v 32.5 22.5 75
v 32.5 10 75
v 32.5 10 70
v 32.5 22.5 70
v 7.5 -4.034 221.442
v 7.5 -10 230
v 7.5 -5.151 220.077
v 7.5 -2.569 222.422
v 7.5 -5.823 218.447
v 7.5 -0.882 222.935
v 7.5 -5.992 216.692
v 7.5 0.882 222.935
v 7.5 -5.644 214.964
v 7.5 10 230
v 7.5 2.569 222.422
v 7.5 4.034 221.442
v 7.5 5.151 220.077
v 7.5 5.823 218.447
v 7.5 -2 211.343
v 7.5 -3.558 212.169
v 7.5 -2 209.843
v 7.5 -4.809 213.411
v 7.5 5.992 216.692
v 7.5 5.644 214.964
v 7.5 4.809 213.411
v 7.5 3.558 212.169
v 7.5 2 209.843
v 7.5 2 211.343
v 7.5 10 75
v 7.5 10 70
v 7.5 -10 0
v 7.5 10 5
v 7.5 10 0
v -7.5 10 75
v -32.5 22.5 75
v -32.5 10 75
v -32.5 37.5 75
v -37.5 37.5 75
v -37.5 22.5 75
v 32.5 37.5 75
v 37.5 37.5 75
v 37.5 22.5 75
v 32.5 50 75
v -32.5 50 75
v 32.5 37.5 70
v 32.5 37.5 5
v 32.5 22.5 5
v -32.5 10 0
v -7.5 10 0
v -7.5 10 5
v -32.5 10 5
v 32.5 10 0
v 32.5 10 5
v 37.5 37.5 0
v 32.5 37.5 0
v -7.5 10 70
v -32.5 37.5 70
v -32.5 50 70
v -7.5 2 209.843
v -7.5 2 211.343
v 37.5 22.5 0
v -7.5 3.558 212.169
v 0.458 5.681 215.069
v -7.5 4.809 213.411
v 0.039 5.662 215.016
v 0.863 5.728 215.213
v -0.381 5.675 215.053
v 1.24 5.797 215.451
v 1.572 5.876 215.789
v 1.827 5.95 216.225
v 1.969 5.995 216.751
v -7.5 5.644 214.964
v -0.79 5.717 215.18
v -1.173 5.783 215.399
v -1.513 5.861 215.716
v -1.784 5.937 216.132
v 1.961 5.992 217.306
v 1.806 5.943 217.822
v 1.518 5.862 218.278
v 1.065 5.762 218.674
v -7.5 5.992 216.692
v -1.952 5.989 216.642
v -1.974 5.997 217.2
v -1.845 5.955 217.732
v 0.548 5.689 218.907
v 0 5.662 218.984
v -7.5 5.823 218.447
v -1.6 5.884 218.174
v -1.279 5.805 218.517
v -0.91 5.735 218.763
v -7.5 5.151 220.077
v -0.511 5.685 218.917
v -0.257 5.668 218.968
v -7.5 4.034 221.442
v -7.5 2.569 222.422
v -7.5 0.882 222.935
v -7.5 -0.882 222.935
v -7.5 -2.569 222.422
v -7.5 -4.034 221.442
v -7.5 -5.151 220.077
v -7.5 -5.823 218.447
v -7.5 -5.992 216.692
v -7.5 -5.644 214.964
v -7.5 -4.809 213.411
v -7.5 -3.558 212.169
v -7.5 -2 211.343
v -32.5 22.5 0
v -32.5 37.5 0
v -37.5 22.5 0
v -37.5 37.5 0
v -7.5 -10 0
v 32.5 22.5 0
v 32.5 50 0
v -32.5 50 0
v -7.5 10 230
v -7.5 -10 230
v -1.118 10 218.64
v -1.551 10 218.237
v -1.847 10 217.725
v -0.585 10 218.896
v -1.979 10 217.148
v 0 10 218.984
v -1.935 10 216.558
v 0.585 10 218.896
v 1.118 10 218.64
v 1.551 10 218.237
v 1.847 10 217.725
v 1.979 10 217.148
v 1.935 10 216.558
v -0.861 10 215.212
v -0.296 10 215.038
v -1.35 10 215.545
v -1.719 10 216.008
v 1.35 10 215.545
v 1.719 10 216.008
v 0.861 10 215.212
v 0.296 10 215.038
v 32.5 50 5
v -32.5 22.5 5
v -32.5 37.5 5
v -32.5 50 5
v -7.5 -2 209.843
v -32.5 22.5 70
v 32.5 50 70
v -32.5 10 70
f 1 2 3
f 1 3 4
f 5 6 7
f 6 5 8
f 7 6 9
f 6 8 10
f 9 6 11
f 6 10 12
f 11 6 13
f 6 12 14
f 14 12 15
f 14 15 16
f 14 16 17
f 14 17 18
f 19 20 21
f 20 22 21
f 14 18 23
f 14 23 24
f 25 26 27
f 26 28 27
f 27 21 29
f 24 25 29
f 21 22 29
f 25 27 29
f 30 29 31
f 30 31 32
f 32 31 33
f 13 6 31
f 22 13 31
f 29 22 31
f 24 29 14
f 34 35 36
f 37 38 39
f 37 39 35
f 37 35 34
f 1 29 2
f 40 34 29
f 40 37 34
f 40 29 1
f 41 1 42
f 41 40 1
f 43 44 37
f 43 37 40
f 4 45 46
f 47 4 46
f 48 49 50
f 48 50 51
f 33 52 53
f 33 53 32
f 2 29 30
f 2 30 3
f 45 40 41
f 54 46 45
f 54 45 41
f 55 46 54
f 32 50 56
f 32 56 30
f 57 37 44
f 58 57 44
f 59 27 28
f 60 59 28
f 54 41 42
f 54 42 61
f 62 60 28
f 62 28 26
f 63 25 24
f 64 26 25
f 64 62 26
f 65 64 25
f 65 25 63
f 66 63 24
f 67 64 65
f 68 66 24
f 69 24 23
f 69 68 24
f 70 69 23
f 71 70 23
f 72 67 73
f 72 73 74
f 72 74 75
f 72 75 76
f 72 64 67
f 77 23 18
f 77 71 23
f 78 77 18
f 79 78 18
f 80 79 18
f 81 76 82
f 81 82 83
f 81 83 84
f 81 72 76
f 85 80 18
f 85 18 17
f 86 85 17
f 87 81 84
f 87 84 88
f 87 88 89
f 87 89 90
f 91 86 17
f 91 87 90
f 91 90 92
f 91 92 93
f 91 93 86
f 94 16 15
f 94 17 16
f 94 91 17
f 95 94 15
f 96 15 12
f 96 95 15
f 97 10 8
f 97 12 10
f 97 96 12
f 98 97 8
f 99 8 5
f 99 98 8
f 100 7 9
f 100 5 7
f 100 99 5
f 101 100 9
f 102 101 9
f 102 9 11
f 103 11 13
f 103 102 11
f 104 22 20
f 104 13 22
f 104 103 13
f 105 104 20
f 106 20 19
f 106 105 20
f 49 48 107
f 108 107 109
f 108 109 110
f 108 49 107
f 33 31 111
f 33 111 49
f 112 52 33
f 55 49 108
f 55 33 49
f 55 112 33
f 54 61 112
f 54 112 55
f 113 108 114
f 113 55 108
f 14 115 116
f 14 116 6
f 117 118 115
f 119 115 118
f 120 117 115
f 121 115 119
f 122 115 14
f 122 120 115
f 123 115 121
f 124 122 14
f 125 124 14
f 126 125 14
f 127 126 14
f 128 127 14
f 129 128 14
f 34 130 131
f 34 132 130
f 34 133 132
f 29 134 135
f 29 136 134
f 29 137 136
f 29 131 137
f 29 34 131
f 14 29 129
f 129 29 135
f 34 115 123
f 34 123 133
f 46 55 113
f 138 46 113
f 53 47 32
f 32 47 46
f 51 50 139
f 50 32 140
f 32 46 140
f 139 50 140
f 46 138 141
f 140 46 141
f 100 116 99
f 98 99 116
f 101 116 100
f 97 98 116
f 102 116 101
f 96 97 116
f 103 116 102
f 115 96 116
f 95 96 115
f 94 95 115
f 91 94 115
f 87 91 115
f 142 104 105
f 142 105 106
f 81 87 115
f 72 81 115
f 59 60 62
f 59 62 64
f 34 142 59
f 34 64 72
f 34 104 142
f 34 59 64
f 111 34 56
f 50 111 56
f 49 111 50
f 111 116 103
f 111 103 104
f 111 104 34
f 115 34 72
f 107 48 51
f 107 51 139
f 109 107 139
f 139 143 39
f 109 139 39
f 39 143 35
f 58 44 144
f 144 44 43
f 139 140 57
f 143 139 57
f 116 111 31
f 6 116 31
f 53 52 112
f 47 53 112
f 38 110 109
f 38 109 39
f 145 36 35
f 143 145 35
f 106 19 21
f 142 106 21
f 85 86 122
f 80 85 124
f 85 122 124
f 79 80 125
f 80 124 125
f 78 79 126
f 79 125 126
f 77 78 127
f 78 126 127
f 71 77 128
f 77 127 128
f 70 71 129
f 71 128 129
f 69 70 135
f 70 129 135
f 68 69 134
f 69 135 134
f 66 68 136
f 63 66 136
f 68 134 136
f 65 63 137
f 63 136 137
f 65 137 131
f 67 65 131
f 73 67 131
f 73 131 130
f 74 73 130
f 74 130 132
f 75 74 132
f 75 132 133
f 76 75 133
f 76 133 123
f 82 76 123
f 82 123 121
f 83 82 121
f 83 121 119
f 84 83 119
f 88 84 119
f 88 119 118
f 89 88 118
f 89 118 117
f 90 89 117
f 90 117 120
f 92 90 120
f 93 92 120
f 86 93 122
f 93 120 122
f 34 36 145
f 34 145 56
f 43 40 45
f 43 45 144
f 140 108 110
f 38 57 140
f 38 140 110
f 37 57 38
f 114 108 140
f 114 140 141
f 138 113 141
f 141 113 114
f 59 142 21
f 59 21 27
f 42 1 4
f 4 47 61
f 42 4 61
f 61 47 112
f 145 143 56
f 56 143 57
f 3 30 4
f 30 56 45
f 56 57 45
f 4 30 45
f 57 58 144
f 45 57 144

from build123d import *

# Parameters (mm, degrees)
SKETCH1_W            = 15
SKETCH1_H            = 20
BOSS_EXTRUDE1_DEPTH  = 230
SKETCH2_W            = 65
SKETCH2_H            = 40
BOSS_EXTRUDE6_DEPTH  = 5
SKETCH7_W            = 75
SKETCH7_H            = 15
BOSS_EXTRUDE7_DEPTH  = 5
SKETCH8_W            = 75
SKETCH8_H            = 15
BOSS_EXTRUDE8_DEPTH  = 5
SKETCH9_W            = 65
SKETCH9_H            = 40
BOSS_EXTRUDE11_DEPTH = 5
CUT_EXTRUDE1_DEPTH   = 240.635139326
SKETCH13_R           = 1.984375
CUT_EXTRUDE2_DEPTH   = 10


with BuildPart() as part:
    # Sketch1 → Boss-Extrude1 (new body)
    with BuildSketch(Plane.XY):
        Rectangle(SKETCH1_W, SKETCH1_H)
    extrude(amount=BOSS_EXTRUDE1_DEPTH)

    # Sketch2 → Boss-Extrude6 (add)
    with BuildSketch(Plane(origin=(0, 0, 0), x_dir=(-1, 0, 0), z_dir=(0, 0, -1))):
        with Locations((0, 30)):
            Rectangle(SKETCH2_W, SKETCH2_H)
    extrude(amount=-BOSS_EXTRUDE6_DEPTH)

    # Sketch7 → Boss-Extrude7 (add)
    with BuildSketch(Plane(origin=(32.5, 0, 0), x_dir=(0, 0, -1), z_dir=(1, 0, 0))):
        with Locations((-37.5, 30)):
            Rectangle(SKETCH7_W, SKETCH7_H)
    extrude(amount=BOSS_EXTRUDE7_DEPTH)

    # Sketch8 → Boss-Extrude8 (add)
    with BuildSketch(Plane.ZY.offset(32.5)):
        with Locations((37.5, 30)):
            Rectangle(SKETCH8_W, SKETCH8_H)
    extrude(amount=BOSS_EXTRUDE8_DEPTH)

    # Sketch9 → Boss-Extrude11 (add)
    with BuildSketch(Plane.XY.offset(75)):
        with Locations((0, 30)):
            Rectangle(SKETCH9_W, SKETCH9_H)
    extrude(amount=-BOSS_EXTRUDE11_DEPTH)

    # Sketch10 → Cut-Extrude1 (cut, through all)
    with BuildSketch(Plane.ZY.offset(7.5)):
        with BuildLine():
            Line((209.843145751, 2), (211.343145751, 2))
            ThreePointArc((211.343145751, 2), (223, 0), (211.343145751, -2))
            Line((211.343145751, -2), (209.843145751, -2))
            Line((209.843145751, -2), (209.843145751, 2))
        make_face()
    extrude(amount=-CUT_EXTRUDE1_DEPTH, mode=Mode.SUBTRACT)

    # Sketch13 → Cut-Extrude2 (cut)
    with BuildSketch(Plane(origin=(0, 10, 0), x_dir=(1, 0, 0), z_dir=(0, 1, 0))):
        with Locations(Location((0, -217, 0), (0, 0, 270))):
            Circle(SKETCH13_R)
    extrude(amount=-CUT_EXTRUDE2_DEPTH, mode=Mode.SUBTRACT)


solid = part.part
